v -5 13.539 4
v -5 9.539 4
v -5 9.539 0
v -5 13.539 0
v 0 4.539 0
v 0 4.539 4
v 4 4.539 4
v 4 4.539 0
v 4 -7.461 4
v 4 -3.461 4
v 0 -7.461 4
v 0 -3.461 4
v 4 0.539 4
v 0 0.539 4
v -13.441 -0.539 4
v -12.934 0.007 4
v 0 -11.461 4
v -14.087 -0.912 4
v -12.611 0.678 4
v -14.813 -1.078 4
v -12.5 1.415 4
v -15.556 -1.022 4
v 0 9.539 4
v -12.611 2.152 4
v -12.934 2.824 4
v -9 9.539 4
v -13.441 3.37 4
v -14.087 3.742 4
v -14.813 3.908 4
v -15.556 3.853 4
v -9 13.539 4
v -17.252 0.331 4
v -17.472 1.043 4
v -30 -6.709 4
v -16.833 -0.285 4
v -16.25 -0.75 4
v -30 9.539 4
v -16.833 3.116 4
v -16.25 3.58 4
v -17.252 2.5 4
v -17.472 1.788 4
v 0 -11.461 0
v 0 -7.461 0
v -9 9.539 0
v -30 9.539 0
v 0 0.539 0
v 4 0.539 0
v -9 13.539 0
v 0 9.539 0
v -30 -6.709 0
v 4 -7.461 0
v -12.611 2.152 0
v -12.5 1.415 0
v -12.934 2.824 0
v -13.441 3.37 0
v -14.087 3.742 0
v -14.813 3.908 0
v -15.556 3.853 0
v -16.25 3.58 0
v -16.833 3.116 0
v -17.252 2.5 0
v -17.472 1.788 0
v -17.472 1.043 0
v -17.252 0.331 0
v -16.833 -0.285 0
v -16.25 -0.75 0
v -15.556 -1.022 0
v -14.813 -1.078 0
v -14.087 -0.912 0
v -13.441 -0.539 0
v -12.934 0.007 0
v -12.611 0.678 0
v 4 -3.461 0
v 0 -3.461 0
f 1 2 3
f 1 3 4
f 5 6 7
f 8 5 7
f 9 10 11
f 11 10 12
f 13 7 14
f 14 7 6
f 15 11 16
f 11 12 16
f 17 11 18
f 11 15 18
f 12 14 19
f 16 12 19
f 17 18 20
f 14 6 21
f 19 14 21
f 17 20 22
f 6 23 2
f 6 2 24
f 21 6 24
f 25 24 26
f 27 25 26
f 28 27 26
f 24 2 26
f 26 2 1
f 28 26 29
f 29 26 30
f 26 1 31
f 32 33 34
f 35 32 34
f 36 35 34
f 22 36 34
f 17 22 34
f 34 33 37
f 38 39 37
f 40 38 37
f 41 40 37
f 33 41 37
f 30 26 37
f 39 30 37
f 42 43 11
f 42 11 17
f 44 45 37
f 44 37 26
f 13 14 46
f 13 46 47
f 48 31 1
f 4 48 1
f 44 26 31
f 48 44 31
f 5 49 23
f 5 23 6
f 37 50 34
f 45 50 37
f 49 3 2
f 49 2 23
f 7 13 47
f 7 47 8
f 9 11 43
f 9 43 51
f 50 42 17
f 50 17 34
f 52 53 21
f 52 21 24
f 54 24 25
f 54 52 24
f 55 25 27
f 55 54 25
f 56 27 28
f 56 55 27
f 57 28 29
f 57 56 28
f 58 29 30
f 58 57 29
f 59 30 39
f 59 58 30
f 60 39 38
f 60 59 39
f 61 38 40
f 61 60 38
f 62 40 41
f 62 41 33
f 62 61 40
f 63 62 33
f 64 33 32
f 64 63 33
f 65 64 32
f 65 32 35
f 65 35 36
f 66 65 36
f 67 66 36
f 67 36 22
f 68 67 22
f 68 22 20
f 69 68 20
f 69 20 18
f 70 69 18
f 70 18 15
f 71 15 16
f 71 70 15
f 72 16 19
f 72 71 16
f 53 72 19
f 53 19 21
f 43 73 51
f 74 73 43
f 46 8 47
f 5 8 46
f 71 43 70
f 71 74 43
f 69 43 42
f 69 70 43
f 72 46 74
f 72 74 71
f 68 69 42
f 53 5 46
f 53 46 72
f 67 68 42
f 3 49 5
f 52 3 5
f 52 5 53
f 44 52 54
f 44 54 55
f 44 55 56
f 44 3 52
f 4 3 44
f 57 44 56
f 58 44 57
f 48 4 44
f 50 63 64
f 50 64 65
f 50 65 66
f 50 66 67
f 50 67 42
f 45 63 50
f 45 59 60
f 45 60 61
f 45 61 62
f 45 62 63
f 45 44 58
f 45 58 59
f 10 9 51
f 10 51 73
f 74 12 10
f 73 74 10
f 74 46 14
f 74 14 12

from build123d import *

# Parameters (mm, degrees)
SKETCH1_R           = 2.5
BOSS_EXTRUDE1_DEPTH = 4
SKETCH2_W           = 4
SKETCH2_H           = 4
BOSS_EXTRUDE2_DEPTH = 4


with BuildPart() as part:
    # Sketch1 → Boss-Extrude1 (new body)
    with BuildSketch(Plane.XY):
        Polygon((0, 9.539473684), (0, -11.460526316), (-30, -6.708993106), (-30, 9.539473684), align=None)
        with Locations((-15, 1.415240289)):
            Circle(SKETCH1_R, mode=Mode.SUBTRACT)
    extrude(amount=BOSS_EXTRUDE1_DEPTH)

    # Sketch2 → Boss-Extrude2 (add)
    with BuildSketch(Plane.XY.offset(4)):
        with Locations((2, 2.539473684)):
            Rectangle(SKETCH2_W, SKETCH2_H)
        with Locations((-7, 11.539473684)):
            Rectangle(SKETCH2_W, SKETCH2_H)
        with Locations((2, -5.460526316)):
            Rectangle(SKETCH2_W, SKETCH2_H)
    extrude(amount=-BOSS_EXTRUDE2_DEPTH)


solid = part.part
